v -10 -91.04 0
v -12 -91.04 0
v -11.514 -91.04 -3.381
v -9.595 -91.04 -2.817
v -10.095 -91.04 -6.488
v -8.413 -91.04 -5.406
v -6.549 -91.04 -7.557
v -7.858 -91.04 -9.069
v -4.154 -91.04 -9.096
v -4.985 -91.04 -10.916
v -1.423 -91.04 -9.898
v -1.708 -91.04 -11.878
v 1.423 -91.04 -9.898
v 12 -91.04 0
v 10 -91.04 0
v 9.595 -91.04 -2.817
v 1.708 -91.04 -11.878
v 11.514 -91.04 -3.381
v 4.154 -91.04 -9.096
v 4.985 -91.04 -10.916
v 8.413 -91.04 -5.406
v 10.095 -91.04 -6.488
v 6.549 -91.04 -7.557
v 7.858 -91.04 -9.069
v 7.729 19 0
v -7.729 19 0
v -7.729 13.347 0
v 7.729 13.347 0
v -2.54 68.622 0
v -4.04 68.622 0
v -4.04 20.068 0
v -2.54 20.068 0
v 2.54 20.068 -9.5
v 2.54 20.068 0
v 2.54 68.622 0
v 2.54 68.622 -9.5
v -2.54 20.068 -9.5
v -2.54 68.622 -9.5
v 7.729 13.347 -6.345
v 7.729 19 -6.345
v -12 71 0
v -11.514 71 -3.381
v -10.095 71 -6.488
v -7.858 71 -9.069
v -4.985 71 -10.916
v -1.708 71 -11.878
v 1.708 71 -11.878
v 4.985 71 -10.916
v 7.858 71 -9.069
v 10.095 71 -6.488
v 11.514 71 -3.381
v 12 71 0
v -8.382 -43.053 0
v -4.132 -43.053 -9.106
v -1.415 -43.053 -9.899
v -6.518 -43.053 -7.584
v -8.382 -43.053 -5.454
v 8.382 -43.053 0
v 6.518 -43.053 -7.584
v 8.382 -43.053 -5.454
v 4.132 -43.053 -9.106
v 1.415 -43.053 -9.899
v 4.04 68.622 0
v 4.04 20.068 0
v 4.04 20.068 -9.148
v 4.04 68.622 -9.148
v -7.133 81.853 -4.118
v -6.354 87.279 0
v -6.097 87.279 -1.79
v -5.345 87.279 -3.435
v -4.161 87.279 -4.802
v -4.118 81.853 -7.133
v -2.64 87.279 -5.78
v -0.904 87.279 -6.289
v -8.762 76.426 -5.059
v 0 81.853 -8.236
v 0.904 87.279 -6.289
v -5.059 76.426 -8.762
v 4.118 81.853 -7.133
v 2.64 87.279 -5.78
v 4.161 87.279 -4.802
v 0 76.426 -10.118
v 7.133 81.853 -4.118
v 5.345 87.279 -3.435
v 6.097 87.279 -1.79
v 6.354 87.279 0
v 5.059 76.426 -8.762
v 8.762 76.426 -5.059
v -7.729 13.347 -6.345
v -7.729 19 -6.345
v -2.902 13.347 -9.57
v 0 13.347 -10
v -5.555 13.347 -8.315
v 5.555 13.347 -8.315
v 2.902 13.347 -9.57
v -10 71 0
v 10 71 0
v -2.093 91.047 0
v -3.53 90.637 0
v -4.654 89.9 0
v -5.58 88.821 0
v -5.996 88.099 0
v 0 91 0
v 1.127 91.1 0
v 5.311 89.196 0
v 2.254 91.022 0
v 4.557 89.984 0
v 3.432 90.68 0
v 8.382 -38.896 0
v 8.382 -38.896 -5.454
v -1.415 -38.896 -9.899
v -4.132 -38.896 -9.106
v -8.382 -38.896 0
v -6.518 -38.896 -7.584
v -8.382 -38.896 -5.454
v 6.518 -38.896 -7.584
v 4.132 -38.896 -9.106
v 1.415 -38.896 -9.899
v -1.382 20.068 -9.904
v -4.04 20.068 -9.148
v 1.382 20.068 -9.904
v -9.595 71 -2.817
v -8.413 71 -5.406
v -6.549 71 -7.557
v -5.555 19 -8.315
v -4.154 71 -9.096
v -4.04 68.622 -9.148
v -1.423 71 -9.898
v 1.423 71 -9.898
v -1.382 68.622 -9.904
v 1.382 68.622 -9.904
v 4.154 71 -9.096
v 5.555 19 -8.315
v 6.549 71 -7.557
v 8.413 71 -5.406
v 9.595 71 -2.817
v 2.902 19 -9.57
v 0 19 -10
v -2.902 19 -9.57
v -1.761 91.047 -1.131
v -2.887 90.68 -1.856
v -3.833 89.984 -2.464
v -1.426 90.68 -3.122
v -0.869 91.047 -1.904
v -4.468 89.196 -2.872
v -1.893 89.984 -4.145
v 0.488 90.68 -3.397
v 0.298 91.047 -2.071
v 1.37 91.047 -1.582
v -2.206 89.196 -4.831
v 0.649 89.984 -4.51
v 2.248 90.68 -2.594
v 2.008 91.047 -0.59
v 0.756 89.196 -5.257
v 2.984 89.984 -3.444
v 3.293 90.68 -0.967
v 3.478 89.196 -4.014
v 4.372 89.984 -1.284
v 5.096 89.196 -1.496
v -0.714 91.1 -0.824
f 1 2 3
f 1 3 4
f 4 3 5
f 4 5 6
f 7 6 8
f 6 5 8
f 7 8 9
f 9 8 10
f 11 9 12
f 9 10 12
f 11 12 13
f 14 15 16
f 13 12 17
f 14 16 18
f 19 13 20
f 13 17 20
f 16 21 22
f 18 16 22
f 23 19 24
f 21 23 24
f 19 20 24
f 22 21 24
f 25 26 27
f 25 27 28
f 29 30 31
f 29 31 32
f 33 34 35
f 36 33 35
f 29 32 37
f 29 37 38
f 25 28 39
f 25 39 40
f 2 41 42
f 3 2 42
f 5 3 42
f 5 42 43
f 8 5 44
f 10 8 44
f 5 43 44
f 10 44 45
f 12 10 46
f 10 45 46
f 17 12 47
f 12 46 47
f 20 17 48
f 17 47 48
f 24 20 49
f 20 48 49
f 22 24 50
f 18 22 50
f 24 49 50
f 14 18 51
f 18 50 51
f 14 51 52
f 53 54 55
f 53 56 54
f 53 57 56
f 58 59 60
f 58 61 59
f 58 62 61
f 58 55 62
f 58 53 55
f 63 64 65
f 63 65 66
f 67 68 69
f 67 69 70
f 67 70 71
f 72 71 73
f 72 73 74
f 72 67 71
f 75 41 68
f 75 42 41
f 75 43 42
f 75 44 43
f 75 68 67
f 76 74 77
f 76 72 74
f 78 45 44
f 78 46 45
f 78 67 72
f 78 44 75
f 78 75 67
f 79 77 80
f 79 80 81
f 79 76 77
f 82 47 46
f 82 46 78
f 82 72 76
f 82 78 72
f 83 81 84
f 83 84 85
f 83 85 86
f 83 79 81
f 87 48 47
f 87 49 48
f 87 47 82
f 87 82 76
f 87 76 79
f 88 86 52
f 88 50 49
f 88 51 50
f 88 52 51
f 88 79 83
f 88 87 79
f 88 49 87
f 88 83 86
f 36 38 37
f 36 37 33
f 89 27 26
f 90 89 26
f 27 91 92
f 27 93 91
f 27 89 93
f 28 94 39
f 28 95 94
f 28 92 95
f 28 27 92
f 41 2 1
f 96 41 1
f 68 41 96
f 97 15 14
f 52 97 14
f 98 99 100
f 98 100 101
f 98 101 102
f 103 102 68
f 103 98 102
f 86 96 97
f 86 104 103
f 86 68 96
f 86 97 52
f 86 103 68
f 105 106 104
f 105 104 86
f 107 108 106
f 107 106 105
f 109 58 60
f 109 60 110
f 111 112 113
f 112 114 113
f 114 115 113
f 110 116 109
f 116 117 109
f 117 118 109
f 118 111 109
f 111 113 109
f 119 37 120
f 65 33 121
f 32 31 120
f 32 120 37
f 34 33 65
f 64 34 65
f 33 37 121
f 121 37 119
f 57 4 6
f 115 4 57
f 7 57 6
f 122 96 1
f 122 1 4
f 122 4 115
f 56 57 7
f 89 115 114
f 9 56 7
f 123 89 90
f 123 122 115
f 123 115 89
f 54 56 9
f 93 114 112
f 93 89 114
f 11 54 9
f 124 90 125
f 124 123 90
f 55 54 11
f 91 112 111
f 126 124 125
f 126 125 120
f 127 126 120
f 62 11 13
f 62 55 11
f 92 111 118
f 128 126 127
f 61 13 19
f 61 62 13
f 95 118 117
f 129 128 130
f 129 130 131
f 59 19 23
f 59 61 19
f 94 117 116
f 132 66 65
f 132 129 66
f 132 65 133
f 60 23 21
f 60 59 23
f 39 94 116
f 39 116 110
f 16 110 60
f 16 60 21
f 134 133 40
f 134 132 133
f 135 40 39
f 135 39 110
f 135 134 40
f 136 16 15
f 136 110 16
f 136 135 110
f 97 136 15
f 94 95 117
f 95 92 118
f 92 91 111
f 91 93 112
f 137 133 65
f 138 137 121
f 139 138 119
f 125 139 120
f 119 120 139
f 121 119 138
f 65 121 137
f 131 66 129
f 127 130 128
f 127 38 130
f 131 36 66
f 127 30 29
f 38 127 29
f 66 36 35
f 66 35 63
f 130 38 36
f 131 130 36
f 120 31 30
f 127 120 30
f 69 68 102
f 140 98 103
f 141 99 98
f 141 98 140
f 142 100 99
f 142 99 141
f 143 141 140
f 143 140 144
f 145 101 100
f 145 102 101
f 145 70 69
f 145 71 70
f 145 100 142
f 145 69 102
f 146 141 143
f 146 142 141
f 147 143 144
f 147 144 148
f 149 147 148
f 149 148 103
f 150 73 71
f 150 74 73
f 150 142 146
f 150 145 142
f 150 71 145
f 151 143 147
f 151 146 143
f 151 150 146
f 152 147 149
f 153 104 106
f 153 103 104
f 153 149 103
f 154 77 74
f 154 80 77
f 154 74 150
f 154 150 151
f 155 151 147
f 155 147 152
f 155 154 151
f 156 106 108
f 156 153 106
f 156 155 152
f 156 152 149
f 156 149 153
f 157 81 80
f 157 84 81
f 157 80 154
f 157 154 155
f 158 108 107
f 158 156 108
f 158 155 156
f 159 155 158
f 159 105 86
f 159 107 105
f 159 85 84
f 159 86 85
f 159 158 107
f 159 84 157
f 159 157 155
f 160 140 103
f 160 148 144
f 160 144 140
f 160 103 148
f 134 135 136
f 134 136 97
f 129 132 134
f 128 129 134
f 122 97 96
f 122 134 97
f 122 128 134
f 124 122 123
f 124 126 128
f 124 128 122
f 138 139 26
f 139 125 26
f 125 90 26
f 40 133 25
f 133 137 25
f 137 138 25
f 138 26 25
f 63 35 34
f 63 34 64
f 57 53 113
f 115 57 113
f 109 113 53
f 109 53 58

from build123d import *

# Parameters (mm, degrees)
SKETCH2_W                = 2
SKETCH2_H                = 162.039928857
BOSS_EXTRUDE1_REACH      = 94.669
BOSS_EXTRUDE1_END_RADIUS = 10
SKETCH4_W                = 15.457813272
SKETCH4_H                = 5.65259454
SKETCH4_W_2              = 16.763190872
SKETCH4_H_2              = 4.156828513
SKETCH4_W_3              = 1.5
SKETCH4_H_3              = 48.554461885
BOSS_EXTRUDE2_REACH      = 104.169
BOSS_EXTRUDE2_START      = -9.5
SKETCH4_4_W              = 5.08
SKETCH4_4_H              = 48.554461885
SKETCH5_W                = 72.783621468
SKETCH5_H                = 192.84631039
CUT_EXTRUDE1_DEPTH       = 93.66850023


with BuildPart() as part:
    # Sketch1 → Revolve1 (revolve)
    with BuildSketch(Plane.XY, mode=Mode.PRIVATE) as revolve1_sk:
        with BuildLine():
            Line((6.354000149, 87.279039692), (12, 71))
            Line((12, 71), (0, 71))
            Line((0, 71), (0, 91))
            add(Edge.make_bspline(
                [(0, 91), (4.668589185, 91.723642341), (6.354000149, 87.279039692)],
                knots=[0, 0, 0, 1, 1, 1], degree=2))
        make_face()
    revolve(revolve1_sk.sketch.rotate(Axis((0, 91, 0), (0, -1, 0)), 180), axis=Axis((0, 91, 0), (0, -1, 0)))

    # Sketch2 → Revolve2 (revolve)
    with BuildSketch(Plane.XY, mode=Mode.PRIVATE) as revolve2_sk:
        with Locations((11, -10.019964429)):
            Rectangle(SKETCH2_W, SKETCH2_H)
    revolve(revolve2_sk.sketch.rotate(Axis((0, 91, 0), (0, -1, 0)), 180), axis=Axis((0, 91, 0), (0, -1, 0)))

    # Boss-Extrude1: up to this cylinder (the profile starts inside it)
    boss_extrude1_end = Plane(origin=(0, 1.68519, 0), z_dir=(0, 1, 0)) * Cylinder(BOSS_EXTRUDE1_END_RADIUS, 295.657228, mode=Mode.PRIVATE)
    # Sketch4 → Boss-Extrude1 (add, up to the surface)
    with BuildSketch(Plane.XY, mode=Mode.PRIVATE) as boss_extrude1_sk1:
        with Locations((0, 16.17370273)):
            Rectangle(SKETCH4_W, SKETCH4_H)
    boss_extrude1_tool1 = extrude(boss_extrude1_sk1.sketch, amount=-BOSS_EXTRUDE1_REACH, mode=Mode.PRIVATE) & boss_extrude1_end
    add(boss_extrude1_tool1.solids().sort_by_distance((0, 16.173703, 0))[0])
    # Sketch4 → Boss-Extrude1 (add, up to the surface)
    with BuildSketch(Plane.XY, mode=Mode.PRIVATE) as boss_extrude1_sk2:
        with Locations((0, -40.974423961)):
            Rectangle(SKETCH4_W_2, SKETCH4_H_2)
    boss_extrude1_tool2 = extrude(boss_extrude1_sk2.sketch, amount=-BOSS_EXTRUDE1_REACH, mode=Mode.PRIVATE) & boss_extrude1_end
    add(boss_extrude1_tool2.solids().sort_by_distance((0, -40.974424, 0))[0])
    # Sketch4 → Boss-Extrude1 (add, up to the surface)
    with BuildSketch(Plane.XY, mode=Mode.PRIVATE) as boss_extrude1_sk3:
        with Locations((3.29, 44.344804049)):
            Rectangle(SKETCH4_W_3, SKETCH4_H_3)
    boss_extrude1_tool3 = extrude(boss_extrude1_sk3.sketch, amount=-BOSS_EXTRUDE1_REACH, mode=Mode.PRIVATE) & boss_extrude1_end
    add(boss_extrude1_tool3.solids().sort_by_distance((3.29, 44.344804, 0))[0])
    # Sketch4 → Boss-Extrude1 (add, up to the surface)
    with BuildSketch(Plane.XY, mode=Mode.PRIVATE) as boss_extrude1_sk4:
        with Locations((-3.29, 44.344804049)):
            Rectangle(SKETCH4_W_3, SKETCH4_H_3)
    boss_extrude1_tool4 = extrude(boss_extrude1_sk4.sketch, amount=-BOSS_EXTRUDE1_REACH, mode=Mode.PRIVATE) & boss_extrude1_end
    add(boss_extrude1_tool4.solids().sort_by_distance((-3.29, 44.344804, 0))[0])

    # Sketch4<4> → Boss-Extrude2 (add, up to next)
    with BuildSketch(Plane.XY.offset(BOSS_EXTRUDE2_START), mode=Mode.PRIVATE) as boss_extrude2_sk1:
        with Locations((0, 44.344804049)):
            Rectangle(SKETCH4_4_W, SKETCH4_4_H)
    boss_extrude2_tool1 = extrude(boss_extrude2_sk1.sketch, amount=-BOSS_EXTRUDE2_REACH, mode=Mode.PRIVATE) - part.part
    add(boss_extrude2_tool1.solids().sort_by_distance((0, 44.344804, -9.5))[0])

    # Sketch5 → Cut-Extrude1 (cut, through all)
    with BuildSketch(Plane.XY):
        Rectangle(SKETCH5_W, SKETCH5_H)
    extrude(amount=CUT_EXTRUDE1_DEPTH, mode=Mode.SUBTRACT)


solid = part.part
